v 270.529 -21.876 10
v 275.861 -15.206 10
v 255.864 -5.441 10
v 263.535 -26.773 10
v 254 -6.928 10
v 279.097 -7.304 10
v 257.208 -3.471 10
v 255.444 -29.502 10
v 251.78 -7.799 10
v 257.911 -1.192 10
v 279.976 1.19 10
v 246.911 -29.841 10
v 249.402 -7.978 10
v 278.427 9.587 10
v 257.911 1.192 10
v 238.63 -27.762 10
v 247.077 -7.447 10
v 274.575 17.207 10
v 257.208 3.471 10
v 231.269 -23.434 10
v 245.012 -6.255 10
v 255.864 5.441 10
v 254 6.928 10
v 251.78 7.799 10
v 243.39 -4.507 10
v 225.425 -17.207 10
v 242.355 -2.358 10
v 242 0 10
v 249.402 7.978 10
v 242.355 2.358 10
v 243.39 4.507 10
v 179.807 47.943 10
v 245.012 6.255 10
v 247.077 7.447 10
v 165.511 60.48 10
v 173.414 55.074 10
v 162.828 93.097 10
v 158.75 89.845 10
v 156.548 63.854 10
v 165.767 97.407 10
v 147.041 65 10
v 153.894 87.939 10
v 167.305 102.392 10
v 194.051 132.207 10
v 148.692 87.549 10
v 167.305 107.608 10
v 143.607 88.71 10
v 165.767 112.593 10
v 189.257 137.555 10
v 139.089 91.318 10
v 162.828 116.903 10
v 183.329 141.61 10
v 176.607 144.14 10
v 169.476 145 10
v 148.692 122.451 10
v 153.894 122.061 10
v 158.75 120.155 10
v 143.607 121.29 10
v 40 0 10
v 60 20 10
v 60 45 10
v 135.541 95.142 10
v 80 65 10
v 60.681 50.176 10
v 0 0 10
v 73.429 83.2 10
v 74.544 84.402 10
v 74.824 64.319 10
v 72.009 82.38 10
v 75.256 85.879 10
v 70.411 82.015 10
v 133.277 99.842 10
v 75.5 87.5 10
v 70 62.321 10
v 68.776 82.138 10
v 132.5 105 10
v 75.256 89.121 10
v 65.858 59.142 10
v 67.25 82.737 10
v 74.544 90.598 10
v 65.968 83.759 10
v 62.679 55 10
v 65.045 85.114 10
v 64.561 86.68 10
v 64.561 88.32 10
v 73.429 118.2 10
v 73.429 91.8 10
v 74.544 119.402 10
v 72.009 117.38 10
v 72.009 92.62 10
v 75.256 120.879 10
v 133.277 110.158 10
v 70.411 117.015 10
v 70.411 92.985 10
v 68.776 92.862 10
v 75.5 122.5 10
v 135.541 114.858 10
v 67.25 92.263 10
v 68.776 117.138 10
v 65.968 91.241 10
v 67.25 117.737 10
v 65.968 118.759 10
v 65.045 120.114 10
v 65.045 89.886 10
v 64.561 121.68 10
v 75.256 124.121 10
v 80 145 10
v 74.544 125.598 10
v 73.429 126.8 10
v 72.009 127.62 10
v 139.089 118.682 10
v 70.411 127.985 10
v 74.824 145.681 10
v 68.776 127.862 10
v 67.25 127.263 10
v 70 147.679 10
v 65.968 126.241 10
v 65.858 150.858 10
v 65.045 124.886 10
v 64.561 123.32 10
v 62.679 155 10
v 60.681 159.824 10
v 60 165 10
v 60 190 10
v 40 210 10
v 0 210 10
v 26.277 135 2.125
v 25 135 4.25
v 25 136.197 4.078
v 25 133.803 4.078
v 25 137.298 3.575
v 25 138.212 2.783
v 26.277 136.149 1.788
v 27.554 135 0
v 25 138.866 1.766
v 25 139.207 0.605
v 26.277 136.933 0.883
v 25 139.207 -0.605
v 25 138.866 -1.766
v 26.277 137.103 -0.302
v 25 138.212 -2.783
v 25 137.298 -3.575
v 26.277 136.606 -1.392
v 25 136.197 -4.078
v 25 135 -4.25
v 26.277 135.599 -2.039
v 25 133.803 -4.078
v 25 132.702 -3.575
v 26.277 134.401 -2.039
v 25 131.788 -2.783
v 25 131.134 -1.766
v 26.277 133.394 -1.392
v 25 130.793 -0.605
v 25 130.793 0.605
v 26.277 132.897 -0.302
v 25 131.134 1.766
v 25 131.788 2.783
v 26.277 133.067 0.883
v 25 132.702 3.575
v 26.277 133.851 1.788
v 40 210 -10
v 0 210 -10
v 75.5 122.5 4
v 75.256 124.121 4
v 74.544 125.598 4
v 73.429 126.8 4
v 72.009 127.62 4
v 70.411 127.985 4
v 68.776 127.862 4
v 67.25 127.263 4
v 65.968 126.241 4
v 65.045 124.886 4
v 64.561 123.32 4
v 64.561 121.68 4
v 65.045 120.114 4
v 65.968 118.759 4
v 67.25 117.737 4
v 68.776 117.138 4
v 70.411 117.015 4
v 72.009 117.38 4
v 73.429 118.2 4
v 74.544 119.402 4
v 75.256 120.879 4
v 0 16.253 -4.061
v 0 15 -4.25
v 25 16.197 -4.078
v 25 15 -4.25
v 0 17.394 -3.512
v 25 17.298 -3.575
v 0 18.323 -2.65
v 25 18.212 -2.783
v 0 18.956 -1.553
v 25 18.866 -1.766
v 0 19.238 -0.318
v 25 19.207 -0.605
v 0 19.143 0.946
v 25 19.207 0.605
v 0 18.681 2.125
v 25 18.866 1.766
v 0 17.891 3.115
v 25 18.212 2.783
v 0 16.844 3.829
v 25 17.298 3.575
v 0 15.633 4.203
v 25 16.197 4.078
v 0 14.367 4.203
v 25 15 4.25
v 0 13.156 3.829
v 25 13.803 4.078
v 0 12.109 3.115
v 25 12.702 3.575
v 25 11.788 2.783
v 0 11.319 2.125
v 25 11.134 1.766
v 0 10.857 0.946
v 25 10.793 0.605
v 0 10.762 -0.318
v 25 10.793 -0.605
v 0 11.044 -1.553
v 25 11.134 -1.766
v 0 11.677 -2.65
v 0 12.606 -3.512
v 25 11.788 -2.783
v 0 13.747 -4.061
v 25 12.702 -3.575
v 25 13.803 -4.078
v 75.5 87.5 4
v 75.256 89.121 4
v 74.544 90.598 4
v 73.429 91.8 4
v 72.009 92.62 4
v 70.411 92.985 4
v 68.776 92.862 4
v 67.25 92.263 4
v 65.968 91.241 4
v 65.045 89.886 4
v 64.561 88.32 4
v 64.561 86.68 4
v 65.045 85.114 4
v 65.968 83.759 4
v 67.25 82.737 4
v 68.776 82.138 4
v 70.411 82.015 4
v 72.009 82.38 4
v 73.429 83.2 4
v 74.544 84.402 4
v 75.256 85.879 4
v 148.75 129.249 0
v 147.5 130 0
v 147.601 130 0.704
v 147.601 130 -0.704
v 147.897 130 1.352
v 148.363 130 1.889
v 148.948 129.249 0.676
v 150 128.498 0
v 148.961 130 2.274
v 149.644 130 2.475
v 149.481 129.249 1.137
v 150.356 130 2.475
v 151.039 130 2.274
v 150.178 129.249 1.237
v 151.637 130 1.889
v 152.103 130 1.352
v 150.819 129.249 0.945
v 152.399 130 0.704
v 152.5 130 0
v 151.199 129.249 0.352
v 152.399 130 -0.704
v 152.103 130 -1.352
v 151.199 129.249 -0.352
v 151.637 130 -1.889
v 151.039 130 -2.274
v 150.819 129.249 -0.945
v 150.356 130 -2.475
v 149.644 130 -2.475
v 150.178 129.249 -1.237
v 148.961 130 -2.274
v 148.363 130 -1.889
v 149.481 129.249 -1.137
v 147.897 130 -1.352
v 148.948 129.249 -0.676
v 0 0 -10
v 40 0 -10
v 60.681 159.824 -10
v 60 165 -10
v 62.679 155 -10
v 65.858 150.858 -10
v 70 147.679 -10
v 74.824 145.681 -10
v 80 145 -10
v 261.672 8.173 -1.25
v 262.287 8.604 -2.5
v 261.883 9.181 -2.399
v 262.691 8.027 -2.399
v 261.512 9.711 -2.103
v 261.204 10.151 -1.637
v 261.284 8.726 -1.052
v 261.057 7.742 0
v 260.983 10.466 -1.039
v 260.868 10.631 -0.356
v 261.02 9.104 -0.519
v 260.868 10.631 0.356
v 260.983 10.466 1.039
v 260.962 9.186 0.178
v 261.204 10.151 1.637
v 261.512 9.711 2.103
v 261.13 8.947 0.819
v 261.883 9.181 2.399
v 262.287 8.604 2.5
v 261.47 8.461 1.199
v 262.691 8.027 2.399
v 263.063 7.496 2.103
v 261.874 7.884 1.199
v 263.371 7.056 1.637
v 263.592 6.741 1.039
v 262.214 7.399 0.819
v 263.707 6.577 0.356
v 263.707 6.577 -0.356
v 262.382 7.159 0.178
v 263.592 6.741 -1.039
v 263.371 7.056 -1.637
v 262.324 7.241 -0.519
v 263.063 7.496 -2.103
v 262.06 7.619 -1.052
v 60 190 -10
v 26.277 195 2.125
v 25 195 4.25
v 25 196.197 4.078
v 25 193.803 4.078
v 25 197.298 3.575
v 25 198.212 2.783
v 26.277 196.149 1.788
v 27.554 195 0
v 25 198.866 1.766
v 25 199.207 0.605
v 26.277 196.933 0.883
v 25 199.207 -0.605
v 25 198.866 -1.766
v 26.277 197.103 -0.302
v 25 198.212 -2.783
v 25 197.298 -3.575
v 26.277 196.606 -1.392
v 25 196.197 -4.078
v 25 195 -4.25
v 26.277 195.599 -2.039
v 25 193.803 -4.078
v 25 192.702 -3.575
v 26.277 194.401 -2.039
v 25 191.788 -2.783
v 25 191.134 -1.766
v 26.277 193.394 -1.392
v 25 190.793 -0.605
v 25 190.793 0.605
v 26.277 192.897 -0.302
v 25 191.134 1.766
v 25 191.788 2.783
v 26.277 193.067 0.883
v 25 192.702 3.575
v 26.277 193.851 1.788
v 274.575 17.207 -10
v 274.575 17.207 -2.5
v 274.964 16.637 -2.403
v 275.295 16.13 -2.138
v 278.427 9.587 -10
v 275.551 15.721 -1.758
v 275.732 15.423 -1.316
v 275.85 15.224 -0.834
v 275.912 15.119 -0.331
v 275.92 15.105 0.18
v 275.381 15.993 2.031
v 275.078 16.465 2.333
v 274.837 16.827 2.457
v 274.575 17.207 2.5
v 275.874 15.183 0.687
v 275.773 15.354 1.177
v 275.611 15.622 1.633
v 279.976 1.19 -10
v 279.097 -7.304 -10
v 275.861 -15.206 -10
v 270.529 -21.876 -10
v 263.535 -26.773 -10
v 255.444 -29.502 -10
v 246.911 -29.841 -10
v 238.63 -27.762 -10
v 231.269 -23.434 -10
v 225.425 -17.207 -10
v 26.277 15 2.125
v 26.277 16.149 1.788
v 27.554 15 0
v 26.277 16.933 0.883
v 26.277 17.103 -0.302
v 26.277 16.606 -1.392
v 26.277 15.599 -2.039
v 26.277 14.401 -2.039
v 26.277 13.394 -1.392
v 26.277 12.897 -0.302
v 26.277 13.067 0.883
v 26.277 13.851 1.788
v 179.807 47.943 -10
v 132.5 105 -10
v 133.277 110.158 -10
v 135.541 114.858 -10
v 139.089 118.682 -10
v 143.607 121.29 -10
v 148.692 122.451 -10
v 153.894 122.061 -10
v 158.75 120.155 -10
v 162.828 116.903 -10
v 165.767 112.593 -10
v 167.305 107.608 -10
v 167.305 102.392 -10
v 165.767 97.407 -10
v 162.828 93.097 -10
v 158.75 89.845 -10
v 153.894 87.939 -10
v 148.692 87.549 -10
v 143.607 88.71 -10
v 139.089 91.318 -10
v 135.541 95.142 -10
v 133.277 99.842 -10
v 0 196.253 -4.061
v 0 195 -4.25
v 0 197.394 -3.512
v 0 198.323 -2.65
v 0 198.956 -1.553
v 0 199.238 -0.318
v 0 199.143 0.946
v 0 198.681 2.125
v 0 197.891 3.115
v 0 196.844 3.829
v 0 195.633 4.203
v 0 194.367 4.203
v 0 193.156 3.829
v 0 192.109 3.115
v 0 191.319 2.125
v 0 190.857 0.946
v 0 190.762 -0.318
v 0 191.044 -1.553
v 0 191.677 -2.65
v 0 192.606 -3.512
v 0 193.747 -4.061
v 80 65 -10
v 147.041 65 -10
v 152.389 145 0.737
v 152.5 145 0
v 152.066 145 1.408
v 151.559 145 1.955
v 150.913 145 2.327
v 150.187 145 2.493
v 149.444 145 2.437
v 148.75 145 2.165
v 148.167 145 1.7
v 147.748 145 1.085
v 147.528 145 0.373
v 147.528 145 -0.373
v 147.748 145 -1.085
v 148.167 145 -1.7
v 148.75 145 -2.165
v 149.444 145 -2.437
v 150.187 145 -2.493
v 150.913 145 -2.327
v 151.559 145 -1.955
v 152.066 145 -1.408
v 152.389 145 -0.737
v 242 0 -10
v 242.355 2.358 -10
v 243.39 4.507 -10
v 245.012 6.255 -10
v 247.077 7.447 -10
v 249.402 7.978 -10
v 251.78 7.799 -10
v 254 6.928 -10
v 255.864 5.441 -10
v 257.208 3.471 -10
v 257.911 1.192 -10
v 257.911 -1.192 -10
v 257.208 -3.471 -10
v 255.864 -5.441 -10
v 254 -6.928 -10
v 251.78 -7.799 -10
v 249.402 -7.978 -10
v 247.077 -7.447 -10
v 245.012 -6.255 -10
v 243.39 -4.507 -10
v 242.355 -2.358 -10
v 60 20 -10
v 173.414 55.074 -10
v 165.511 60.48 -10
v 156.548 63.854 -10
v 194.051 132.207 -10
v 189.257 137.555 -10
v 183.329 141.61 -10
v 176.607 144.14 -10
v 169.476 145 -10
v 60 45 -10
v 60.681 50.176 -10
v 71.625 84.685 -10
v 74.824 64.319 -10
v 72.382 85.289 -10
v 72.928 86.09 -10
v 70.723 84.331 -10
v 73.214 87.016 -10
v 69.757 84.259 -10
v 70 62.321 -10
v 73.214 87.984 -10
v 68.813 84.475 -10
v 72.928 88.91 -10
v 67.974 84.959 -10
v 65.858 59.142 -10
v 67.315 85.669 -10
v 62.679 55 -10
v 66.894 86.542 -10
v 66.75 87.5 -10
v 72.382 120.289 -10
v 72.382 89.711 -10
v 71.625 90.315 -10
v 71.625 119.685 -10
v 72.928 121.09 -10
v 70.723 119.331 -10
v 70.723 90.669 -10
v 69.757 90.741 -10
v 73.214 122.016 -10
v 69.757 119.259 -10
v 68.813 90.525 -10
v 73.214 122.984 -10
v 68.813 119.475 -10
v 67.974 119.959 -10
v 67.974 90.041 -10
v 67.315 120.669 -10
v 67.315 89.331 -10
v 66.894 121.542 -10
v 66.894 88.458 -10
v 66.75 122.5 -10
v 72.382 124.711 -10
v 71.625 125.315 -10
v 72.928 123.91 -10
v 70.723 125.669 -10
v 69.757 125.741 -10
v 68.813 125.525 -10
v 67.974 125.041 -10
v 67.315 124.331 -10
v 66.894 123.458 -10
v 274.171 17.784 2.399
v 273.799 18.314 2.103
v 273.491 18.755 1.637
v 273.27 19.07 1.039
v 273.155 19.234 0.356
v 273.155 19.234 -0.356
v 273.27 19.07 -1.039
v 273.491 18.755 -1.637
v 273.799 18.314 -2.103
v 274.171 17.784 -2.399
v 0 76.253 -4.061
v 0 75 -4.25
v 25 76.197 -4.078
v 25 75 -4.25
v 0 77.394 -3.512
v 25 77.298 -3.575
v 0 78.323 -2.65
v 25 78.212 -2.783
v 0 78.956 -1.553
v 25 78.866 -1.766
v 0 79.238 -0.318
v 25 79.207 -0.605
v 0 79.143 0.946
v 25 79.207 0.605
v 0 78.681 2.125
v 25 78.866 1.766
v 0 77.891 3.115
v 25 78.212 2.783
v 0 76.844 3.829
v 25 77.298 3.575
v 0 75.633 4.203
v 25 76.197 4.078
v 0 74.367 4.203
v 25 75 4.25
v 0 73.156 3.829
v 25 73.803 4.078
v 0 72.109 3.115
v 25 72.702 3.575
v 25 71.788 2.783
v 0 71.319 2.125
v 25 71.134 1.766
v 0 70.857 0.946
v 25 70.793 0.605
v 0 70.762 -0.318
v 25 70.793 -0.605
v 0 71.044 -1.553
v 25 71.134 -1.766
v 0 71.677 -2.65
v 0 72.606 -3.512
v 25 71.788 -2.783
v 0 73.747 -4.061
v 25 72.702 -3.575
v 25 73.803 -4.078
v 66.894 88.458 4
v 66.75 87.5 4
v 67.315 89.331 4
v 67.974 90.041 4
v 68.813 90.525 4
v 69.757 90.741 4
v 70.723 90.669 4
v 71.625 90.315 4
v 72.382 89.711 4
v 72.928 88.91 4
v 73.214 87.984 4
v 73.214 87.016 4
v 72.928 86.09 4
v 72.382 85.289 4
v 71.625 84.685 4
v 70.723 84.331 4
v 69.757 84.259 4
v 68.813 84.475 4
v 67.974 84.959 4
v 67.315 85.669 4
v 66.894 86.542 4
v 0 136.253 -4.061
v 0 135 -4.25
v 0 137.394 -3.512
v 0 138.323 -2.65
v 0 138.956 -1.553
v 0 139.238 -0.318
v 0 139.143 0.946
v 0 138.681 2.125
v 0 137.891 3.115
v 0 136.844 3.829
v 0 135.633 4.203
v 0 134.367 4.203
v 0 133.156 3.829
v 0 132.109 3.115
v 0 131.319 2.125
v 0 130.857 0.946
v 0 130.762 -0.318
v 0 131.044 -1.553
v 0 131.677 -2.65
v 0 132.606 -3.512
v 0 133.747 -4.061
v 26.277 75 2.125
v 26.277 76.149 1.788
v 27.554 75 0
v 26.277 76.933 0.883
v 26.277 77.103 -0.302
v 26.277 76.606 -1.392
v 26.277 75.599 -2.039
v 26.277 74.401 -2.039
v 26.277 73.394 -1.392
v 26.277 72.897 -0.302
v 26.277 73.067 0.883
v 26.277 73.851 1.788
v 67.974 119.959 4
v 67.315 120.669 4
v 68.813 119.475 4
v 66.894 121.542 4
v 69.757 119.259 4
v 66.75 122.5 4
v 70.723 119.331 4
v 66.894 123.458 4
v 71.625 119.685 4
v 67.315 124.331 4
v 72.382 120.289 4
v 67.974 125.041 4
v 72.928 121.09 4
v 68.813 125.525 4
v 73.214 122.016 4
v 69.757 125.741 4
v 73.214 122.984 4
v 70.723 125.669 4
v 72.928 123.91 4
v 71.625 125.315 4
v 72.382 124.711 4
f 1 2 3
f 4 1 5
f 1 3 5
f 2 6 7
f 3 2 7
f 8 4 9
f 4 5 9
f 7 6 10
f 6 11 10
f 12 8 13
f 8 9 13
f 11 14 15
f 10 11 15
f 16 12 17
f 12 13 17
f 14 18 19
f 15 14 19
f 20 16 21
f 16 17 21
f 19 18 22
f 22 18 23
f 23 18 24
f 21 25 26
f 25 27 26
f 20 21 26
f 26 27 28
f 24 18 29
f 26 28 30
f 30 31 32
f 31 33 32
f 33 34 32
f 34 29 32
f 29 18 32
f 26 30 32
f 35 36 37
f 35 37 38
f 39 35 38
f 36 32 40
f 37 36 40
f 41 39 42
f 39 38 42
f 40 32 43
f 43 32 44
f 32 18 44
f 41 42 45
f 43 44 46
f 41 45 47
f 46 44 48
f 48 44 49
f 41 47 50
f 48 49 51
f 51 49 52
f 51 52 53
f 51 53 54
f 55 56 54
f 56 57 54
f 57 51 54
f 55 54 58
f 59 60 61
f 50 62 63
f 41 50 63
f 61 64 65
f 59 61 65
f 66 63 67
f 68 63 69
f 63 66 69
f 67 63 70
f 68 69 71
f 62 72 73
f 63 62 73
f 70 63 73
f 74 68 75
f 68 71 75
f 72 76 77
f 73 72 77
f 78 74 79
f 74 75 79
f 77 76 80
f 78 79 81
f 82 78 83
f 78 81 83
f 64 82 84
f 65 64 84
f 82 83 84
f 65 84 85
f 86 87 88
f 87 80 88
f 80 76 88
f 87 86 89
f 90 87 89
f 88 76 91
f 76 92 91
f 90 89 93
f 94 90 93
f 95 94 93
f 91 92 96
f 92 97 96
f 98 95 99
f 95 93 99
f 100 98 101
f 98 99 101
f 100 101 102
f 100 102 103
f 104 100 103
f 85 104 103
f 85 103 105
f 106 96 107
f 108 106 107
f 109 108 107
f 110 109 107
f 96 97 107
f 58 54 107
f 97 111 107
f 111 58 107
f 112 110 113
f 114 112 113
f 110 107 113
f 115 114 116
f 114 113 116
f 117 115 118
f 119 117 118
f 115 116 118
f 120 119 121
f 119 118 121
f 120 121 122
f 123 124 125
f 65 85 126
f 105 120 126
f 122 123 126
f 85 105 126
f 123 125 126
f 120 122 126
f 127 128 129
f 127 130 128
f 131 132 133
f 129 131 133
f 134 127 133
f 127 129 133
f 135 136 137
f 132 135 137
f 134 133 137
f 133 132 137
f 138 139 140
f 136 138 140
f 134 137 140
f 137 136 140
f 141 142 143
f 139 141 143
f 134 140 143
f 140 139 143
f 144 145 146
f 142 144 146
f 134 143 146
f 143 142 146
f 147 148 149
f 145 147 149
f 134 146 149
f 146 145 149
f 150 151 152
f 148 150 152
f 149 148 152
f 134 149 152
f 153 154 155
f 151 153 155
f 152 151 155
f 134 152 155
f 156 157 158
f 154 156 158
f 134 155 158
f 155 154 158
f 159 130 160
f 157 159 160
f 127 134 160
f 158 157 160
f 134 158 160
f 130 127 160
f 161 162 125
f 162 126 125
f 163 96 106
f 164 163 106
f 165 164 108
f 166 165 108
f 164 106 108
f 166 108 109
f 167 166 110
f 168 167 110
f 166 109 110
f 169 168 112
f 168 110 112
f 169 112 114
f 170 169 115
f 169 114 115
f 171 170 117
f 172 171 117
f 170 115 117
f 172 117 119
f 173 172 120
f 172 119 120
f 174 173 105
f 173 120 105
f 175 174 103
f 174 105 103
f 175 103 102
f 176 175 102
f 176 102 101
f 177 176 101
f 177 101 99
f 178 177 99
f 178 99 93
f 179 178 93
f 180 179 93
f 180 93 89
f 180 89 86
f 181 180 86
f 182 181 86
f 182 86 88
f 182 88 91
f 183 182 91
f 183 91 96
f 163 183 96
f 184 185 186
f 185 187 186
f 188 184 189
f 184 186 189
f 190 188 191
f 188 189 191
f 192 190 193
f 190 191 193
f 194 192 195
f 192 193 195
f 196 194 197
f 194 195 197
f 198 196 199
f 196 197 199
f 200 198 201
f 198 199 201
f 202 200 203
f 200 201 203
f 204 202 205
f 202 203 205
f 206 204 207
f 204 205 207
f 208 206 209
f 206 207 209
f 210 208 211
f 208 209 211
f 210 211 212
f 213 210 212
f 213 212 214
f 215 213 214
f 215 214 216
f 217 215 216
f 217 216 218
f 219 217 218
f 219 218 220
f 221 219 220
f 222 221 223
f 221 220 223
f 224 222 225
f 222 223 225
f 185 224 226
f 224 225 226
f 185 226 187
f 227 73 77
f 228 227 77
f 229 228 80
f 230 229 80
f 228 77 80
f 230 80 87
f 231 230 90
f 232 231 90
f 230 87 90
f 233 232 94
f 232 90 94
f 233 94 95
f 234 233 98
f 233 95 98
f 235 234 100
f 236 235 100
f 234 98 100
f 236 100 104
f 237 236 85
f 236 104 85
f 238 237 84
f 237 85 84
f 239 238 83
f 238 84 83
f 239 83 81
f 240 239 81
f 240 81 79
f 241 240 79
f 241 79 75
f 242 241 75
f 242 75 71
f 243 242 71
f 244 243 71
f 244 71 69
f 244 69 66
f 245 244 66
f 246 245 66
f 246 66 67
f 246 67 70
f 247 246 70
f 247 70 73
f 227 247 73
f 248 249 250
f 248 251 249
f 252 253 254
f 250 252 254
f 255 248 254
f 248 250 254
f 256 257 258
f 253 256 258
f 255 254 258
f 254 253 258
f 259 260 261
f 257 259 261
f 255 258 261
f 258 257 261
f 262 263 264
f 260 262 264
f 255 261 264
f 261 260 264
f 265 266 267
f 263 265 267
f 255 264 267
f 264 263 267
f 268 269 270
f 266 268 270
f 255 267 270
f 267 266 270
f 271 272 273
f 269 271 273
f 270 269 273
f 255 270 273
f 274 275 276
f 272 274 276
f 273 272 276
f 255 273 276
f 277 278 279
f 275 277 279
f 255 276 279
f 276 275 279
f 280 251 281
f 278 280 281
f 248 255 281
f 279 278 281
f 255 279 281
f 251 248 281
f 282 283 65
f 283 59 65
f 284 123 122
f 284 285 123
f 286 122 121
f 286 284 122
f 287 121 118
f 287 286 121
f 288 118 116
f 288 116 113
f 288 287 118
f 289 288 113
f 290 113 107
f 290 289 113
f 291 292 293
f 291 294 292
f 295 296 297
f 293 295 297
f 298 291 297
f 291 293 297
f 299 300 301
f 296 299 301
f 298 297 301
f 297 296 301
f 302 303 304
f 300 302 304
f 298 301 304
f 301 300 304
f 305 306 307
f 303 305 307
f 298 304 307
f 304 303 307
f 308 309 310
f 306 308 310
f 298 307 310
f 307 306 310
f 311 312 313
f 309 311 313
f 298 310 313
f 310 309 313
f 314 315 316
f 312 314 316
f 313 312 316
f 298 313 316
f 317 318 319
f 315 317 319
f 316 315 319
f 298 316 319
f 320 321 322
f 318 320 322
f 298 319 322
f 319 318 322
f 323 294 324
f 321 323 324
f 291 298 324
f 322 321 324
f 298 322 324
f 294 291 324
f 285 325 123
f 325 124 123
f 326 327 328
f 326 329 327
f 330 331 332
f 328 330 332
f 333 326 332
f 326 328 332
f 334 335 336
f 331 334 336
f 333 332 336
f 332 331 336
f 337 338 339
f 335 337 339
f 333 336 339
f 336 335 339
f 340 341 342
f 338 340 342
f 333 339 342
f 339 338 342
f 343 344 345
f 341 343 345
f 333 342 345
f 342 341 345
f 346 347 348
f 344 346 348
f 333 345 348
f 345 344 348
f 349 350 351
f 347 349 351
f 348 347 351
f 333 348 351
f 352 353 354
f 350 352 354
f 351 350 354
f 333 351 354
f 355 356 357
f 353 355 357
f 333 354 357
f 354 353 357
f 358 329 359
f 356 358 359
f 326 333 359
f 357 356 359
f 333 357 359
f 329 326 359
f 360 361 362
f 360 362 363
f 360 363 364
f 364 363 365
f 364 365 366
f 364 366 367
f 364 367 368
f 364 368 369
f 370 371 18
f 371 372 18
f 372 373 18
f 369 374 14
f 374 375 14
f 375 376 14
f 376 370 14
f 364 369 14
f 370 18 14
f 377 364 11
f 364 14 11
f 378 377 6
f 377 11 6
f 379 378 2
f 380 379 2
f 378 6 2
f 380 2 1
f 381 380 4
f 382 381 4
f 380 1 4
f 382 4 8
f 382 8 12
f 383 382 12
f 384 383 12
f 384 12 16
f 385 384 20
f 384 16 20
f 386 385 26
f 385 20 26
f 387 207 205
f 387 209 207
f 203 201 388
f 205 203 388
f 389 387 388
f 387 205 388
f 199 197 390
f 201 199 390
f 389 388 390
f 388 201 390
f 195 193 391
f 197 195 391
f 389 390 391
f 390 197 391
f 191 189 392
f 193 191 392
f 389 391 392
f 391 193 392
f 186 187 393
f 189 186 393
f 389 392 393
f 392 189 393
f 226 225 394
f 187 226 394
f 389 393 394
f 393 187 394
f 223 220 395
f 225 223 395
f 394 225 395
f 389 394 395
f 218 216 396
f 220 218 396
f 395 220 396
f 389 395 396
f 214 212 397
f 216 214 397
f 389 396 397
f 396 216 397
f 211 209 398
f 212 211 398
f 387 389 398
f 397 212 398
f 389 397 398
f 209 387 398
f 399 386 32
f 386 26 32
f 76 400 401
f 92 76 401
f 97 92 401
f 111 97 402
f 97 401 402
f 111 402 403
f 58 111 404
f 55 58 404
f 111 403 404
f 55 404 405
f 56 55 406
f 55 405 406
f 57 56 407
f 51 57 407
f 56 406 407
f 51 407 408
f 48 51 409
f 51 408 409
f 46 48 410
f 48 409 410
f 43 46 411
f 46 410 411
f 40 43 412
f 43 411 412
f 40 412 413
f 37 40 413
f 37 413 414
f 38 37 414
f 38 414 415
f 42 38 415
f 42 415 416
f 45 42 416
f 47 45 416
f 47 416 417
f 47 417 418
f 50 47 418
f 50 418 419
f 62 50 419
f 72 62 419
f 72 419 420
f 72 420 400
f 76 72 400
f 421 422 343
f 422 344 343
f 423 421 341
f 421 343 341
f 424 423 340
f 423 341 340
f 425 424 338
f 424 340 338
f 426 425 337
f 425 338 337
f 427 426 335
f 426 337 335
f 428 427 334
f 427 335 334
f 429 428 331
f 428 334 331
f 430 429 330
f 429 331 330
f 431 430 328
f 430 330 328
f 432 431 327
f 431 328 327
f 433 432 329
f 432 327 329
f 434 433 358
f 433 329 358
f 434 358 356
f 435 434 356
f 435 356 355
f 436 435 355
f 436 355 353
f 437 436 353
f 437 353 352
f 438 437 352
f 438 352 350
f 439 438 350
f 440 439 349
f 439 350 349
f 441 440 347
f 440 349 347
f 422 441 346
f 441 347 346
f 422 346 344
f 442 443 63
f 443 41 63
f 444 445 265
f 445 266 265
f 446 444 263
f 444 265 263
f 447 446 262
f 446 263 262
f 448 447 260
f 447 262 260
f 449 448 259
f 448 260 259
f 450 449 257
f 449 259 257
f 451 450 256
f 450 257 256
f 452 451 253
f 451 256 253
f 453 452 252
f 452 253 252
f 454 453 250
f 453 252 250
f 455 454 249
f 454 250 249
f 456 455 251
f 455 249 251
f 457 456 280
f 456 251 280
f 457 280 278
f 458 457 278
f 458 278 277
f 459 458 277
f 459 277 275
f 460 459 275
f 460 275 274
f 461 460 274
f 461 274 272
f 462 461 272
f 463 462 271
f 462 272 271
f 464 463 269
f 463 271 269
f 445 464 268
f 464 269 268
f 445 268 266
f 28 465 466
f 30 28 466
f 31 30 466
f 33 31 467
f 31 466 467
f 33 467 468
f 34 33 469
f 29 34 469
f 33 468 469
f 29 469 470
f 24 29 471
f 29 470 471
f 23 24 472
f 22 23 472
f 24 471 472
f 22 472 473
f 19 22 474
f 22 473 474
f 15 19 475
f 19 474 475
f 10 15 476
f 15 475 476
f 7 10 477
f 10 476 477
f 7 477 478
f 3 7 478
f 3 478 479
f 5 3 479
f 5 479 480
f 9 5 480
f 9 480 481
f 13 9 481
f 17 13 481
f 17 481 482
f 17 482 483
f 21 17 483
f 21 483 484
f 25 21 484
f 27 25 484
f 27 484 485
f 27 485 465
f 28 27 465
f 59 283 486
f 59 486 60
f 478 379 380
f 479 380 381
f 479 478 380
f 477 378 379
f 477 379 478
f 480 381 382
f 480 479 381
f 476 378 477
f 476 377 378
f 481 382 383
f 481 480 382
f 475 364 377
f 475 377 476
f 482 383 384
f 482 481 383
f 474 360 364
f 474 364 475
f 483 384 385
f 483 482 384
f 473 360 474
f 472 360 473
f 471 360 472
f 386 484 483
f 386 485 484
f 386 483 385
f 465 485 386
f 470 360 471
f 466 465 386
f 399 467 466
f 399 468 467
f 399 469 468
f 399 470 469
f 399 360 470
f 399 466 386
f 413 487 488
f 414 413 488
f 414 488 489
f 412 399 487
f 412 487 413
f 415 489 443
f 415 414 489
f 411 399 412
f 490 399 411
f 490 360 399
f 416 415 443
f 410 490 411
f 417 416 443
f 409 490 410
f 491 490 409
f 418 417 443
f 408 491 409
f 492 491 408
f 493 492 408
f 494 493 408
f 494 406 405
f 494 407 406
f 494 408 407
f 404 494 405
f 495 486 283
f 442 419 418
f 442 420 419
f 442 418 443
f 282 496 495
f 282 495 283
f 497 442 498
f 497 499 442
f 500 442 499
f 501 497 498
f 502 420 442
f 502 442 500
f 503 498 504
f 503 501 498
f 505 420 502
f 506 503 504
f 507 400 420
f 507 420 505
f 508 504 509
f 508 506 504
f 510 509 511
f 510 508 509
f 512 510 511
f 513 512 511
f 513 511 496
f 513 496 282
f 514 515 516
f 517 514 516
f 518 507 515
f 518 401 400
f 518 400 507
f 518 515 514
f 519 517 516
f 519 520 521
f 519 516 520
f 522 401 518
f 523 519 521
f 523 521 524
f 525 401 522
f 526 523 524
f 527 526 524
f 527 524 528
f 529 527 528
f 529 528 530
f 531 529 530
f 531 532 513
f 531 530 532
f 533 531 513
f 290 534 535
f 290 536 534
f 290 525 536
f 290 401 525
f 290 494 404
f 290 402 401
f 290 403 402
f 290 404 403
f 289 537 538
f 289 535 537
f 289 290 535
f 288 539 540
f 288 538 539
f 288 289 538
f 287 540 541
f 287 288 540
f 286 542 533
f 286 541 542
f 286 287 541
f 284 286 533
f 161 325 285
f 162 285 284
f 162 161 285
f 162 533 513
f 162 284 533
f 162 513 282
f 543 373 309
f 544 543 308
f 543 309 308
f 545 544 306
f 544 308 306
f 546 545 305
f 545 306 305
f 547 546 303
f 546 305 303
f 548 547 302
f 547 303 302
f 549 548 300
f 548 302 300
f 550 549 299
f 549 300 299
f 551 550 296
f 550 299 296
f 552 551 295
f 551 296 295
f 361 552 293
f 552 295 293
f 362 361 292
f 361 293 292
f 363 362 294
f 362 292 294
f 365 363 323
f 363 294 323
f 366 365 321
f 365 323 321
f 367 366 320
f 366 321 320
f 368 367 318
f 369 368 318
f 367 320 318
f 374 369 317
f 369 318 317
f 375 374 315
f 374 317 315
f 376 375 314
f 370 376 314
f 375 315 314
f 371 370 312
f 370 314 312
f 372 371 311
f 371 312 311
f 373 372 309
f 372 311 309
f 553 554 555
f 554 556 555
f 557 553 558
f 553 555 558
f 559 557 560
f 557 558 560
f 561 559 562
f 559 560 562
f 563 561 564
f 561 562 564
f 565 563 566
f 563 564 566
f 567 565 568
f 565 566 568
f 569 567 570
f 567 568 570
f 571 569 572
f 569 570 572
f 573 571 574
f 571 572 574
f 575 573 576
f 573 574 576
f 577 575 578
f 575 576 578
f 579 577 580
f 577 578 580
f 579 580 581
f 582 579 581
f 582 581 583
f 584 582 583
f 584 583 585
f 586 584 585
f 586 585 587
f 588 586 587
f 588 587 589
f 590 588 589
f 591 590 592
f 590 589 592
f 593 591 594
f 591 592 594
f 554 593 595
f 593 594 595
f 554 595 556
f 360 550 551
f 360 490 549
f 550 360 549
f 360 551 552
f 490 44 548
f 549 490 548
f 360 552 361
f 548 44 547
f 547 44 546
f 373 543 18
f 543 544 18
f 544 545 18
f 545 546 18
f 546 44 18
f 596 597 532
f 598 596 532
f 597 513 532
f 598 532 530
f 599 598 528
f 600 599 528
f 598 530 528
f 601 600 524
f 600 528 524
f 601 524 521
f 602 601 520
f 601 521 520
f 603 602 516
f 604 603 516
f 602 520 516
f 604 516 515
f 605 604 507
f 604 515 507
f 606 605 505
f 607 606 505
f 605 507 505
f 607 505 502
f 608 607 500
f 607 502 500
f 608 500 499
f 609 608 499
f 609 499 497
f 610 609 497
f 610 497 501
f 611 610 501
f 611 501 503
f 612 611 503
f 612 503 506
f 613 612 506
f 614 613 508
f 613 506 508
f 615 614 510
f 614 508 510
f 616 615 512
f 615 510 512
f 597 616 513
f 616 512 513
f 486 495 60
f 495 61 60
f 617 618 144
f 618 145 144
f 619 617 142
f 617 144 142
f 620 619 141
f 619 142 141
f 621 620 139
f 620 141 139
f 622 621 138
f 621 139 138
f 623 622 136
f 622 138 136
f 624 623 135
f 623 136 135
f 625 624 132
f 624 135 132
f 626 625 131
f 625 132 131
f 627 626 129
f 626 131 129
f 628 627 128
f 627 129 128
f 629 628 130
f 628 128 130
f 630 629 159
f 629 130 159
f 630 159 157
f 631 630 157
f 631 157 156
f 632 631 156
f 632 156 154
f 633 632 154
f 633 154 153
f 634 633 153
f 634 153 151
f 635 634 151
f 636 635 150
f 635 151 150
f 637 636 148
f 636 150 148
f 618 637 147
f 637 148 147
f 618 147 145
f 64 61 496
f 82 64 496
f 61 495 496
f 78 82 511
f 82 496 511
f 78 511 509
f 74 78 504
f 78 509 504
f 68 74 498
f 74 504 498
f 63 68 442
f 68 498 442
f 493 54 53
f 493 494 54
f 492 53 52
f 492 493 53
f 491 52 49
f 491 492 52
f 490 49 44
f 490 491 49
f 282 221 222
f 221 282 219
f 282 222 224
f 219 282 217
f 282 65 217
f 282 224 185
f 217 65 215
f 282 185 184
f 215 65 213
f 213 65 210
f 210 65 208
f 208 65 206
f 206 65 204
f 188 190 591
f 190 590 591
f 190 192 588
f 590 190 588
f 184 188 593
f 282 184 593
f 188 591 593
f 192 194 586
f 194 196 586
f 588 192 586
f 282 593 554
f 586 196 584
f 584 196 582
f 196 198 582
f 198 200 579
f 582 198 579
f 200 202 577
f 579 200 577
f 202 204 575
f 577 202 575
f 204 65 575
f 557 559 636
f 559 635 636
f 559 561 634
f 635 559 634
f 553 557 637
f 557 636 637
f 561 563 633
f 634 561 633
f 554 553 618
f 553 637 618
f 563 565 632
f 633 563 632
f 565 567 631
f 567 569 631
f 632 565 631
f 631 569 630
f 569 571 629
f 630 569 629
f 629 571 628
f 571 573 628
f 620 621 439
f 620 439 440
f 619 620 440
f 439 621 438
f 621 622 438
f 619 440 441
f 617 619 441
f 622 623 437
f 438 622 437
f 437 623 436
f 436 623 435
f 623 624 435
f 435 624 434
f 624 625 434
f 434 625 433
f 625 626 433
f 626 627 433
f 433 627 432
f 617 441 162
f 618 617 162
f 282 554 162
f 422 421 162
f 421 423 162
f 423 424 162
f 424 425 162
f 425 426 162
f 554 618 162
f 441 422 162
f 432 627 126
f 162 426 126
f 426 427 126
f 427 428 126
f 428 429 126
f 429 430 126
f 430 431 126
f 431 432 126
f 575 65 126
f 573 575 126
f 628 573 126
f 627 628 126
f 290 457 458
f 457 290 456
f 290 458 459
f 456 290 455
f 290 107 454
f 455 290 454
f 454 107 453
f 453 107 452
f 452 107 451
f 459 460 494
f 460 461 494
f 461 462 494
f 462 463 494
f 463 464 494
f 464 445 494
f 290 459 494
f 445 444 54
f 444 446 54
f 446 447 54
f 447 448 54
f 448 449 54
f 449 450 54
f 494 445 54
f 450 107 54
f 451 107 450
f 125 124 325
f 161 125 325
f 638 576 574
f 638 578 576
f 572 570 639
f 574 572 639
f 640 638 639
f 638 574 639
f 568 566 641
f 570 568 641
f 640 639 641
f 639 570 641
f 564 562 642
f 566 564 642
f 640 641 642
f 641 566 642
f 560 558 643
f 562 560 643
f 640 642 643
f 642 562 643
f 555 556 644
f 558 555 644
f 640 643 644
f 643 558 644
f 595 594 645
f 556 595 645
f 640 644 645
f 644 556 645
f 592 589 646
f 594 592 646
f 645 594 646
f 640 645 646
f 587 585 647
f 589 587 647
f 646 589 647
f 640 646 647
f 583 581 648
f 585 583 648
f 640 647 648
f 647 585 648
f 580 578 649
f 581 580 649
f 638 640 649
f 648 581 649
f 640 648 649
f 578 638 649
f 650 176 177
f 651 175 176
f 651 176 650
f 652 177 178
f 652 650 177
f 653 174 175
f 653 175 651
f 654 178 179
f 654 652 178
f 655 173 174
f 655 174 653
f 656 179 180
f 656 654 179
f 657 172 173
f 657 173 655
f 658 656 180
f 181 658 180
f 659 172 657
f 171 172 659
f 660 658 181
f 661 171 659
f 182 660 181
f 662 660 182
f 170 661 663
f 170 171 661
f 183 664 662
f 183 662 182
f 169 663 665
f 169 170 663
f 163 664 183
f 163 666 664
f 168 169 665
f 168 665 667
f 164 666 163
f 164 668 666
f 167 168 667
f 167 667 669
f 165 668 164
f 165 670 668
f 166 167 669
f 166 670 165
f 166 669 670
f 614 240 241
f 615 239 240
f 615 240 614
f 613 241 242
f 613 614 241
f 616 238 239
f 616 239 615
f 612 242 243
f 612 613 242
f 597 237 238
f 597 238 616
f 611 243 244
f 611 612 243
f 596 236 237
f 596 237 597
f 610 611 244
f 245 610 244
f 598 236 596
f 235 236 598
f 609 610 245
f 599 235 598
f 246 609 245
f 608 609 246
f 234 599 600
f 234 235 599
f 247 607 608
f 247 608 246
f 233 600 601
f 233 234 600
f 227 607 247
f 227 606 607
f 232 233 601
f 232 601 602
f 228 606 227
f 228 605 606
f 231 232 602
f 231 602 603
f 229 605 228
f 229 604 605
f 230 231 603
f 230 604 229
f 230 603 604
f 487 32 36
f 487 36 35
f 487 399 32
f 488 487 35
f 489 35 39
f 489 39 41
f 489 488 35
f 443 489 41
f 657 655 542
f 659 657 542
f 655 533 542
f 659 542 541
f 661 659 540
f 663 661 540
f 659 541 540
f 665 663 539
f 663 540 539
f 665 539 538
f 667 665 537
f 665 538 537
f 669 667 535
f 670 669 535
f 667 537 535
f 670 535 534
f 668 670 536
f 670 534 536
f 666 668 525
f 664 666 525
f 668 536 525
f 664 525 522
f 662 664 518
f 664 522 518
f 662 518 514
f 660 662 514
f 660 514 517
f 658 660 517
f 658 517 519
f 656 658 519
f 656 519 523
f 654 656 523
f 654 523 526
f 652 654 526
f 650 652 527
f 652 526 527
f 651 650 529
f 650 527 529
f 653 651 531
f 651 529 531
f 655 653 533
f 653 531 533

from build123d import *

# Parameters (mm, degrees)
EXTRUDE_1_DEPTH              = 10
CHAMFER_1_SIZE               = 20
FILLET_1_R                   = 20
FILLET_2_R                   = 30
FILLET_3_R                   = 40
HOLE_WIZARD_M10_1_D          = 8.5
HOLE_WIZARD_M10_1_DEPTH      = 25
HOLE_WIZARD_M10_1_TIP        = 2.553657631
HOLE_WIZARD_M6_1_D           = 6.5
HOLE_WIZARD_M6_1_CBORE_D     = 11
HOLE_WIZARD_M6_1_CBORE_DEPTH = 6
HOLE_WIZARD_1_D              = 35
HOLE_WIZARD_2_D              = 16
HOLE_WIZARD_2_DEPTH          = 38
HOLE_WIZARD_M6_1_2_D         = 5
HOLE_WIZARD_M6_1_2_DEPTH     = 15
HOLE_WIZARD_M6_1_2_TIP       = 1.502151548
HOLE_WIZARD_M6_2_D           = 5
HOLE_WIZARD_M6_2_DEPTH       = 15
HOLE_WIZARD_M6_2_TIP         = 1.502151548


with BuildPart() as part:
    # 草图1 → 凸台-拉伸1 (new, symmetric)
    with BuildSketch(Plane.XY):
        with BuildLine():
            Line((0, 210), (60, 210))
            Line((60, 210), (60, 145))
            Line((60, 145), (185.093144622, 145))
            Line((185.093144622, 145), (274.574561329, 17.207293091))
            ThreePointArc((274.574561329, 17.207293091), (267.207293091, -24.574561329), (225.425438671, -17.207293091))
            Line((225.425438671, -17.207293091), (167.863272354, 65))
            Line((167.863272354, 65), (60, 65))
            Line((60, 65), (60, 0))
            Line((60, 0), (0, 0))
            Line((0, 0), (0, 210))
        make_face()
    extrude(amount=EXTRUDE_1_DEPTH, both=True)

    # 倒角1
    chamfer_1_edges = [part.edges().sort_by_distance(p)[0] for p in [
        (60, 0, 0),
        (60, 210, 0),
    ]]
    chamfer(chamfer_1_edges, length=CHAMFER_1_SIZE)

    # 圆角1
    fillet_1_edges = [part.edges().sort_by_distance(p)[0] for p in [
        (60, 145, 0),
        (60, 65, 0),
    ]]
    fillet(fillet_1_edges, radius=FILLET_1_R)

    # 圆角2
    fillet_2_edges = [part.edges().sort_by_distance(p)[0] for p in [
        (185.093144622, 145, 0),
    ]]
    fillet(fillet_2_edges, radius=FILLET_2_R)

    # 圆角3
    fillet_3_edges = [part.edges().sort_by_distance(p)[0] for p in [
        (167.863272354, 65, 0),
    ]]
    fillet(fillet_3_edges, radius=FILLET_3_R)

    # M10 螺纹孔1
    with Locations(Plane.ZY):
        with Locations((0, 195), (0, 135), (0, 75), (0, 15)):
            Hole(HOLE_WIZARD_M10_1_D / 2, depth=HOLE_WIZARD_M10_1_DEPTH)
            with Locations((0, 0, -(HOLE_WIZARD_M10_1_DEPTH + HOLE_WIZARD_M10_1_TIP / 2))):  # 118° drill point
                Cone(0, HOLE_WIZARD_M10_1_D / 2, HOLE_WIZARD_M10_1_TIP, mode=Mode.SUBTRACT)

    # Hole Wizard M6 _1 (through all)
    with Locations(Plane.XY.offset(10)):
        with Locations((70, 122.5), (70, 87.5)):
            CounterBoreHole(HOLE_WIZARD_M6_1_D / 2, HOLE_WIZARD_M6_1_CBORE_D / 2, HOLE_WIZARD_M6_1_CBORE_DEPTH)

    # 孔1 (through all)
    with Locations(Plane.XY.offset(10)):
        with Locations((150, 105)):
            Hole(HOLE_WIZARD_1_D / 2)

    # 孔2
    with Locations(Plane.XY.offset(10)):
        with Locations((250, 0)):
            Hole(HOLE_WIZARD_2_D / 2, depth=HOLE_WIZARD_2_DEPTH)

    # Hole Wizard M6 _1 2
    with Locations(Plane(origin=(0, 145, 0), x_dir=(-1, 0, 0), z_dir=(0, 1, 0))):
        with Locations((-150, 0)):
            Hole(HOLE_WIZARD_M6_1_2_D / 2, depth=HOLE_WIZARD_M6_1_2_DEPTH)
            with Locations((0, 0, -(HOLE_WIZARD_M6_1_2_DEPTH + HOLE_WIZARD_M6_1_2_TIP / 2))):  # 118° drill point
                Cone(0, HOLE_WIZARD_M6_1_2_D / 2, HOLE_WIZARD_M6_1_2_TIP, mode=Mode.SUBTRACT)

    # M6 螺纹孔2
    with Locations(Plane(origin=(192.327079244, 134.668870689, 0), x_dir=(0, 0, -1), z_dir=(0.8191520442889934, 0.573576436351044, 0))):
        with Locations((0, -143.394109088)):
            Hole(HOLE_WIZARD_M6_2_D / 2, depth=HOLE_WIZARD_M6_2_DEPTH)
            with Locations((0, 0, -(HOLE_WIZARD_M6_2_DEPTH + HOLE_WIZARD_M6_2_TIP / 2))):  # 118° drill point
                Cone(0, HOLE_WIZARD_M6_2_D / 2, HOLE_WIZARD_M6_2_TIP, mode=Mode.SUBTRACT)


solid = part.part
